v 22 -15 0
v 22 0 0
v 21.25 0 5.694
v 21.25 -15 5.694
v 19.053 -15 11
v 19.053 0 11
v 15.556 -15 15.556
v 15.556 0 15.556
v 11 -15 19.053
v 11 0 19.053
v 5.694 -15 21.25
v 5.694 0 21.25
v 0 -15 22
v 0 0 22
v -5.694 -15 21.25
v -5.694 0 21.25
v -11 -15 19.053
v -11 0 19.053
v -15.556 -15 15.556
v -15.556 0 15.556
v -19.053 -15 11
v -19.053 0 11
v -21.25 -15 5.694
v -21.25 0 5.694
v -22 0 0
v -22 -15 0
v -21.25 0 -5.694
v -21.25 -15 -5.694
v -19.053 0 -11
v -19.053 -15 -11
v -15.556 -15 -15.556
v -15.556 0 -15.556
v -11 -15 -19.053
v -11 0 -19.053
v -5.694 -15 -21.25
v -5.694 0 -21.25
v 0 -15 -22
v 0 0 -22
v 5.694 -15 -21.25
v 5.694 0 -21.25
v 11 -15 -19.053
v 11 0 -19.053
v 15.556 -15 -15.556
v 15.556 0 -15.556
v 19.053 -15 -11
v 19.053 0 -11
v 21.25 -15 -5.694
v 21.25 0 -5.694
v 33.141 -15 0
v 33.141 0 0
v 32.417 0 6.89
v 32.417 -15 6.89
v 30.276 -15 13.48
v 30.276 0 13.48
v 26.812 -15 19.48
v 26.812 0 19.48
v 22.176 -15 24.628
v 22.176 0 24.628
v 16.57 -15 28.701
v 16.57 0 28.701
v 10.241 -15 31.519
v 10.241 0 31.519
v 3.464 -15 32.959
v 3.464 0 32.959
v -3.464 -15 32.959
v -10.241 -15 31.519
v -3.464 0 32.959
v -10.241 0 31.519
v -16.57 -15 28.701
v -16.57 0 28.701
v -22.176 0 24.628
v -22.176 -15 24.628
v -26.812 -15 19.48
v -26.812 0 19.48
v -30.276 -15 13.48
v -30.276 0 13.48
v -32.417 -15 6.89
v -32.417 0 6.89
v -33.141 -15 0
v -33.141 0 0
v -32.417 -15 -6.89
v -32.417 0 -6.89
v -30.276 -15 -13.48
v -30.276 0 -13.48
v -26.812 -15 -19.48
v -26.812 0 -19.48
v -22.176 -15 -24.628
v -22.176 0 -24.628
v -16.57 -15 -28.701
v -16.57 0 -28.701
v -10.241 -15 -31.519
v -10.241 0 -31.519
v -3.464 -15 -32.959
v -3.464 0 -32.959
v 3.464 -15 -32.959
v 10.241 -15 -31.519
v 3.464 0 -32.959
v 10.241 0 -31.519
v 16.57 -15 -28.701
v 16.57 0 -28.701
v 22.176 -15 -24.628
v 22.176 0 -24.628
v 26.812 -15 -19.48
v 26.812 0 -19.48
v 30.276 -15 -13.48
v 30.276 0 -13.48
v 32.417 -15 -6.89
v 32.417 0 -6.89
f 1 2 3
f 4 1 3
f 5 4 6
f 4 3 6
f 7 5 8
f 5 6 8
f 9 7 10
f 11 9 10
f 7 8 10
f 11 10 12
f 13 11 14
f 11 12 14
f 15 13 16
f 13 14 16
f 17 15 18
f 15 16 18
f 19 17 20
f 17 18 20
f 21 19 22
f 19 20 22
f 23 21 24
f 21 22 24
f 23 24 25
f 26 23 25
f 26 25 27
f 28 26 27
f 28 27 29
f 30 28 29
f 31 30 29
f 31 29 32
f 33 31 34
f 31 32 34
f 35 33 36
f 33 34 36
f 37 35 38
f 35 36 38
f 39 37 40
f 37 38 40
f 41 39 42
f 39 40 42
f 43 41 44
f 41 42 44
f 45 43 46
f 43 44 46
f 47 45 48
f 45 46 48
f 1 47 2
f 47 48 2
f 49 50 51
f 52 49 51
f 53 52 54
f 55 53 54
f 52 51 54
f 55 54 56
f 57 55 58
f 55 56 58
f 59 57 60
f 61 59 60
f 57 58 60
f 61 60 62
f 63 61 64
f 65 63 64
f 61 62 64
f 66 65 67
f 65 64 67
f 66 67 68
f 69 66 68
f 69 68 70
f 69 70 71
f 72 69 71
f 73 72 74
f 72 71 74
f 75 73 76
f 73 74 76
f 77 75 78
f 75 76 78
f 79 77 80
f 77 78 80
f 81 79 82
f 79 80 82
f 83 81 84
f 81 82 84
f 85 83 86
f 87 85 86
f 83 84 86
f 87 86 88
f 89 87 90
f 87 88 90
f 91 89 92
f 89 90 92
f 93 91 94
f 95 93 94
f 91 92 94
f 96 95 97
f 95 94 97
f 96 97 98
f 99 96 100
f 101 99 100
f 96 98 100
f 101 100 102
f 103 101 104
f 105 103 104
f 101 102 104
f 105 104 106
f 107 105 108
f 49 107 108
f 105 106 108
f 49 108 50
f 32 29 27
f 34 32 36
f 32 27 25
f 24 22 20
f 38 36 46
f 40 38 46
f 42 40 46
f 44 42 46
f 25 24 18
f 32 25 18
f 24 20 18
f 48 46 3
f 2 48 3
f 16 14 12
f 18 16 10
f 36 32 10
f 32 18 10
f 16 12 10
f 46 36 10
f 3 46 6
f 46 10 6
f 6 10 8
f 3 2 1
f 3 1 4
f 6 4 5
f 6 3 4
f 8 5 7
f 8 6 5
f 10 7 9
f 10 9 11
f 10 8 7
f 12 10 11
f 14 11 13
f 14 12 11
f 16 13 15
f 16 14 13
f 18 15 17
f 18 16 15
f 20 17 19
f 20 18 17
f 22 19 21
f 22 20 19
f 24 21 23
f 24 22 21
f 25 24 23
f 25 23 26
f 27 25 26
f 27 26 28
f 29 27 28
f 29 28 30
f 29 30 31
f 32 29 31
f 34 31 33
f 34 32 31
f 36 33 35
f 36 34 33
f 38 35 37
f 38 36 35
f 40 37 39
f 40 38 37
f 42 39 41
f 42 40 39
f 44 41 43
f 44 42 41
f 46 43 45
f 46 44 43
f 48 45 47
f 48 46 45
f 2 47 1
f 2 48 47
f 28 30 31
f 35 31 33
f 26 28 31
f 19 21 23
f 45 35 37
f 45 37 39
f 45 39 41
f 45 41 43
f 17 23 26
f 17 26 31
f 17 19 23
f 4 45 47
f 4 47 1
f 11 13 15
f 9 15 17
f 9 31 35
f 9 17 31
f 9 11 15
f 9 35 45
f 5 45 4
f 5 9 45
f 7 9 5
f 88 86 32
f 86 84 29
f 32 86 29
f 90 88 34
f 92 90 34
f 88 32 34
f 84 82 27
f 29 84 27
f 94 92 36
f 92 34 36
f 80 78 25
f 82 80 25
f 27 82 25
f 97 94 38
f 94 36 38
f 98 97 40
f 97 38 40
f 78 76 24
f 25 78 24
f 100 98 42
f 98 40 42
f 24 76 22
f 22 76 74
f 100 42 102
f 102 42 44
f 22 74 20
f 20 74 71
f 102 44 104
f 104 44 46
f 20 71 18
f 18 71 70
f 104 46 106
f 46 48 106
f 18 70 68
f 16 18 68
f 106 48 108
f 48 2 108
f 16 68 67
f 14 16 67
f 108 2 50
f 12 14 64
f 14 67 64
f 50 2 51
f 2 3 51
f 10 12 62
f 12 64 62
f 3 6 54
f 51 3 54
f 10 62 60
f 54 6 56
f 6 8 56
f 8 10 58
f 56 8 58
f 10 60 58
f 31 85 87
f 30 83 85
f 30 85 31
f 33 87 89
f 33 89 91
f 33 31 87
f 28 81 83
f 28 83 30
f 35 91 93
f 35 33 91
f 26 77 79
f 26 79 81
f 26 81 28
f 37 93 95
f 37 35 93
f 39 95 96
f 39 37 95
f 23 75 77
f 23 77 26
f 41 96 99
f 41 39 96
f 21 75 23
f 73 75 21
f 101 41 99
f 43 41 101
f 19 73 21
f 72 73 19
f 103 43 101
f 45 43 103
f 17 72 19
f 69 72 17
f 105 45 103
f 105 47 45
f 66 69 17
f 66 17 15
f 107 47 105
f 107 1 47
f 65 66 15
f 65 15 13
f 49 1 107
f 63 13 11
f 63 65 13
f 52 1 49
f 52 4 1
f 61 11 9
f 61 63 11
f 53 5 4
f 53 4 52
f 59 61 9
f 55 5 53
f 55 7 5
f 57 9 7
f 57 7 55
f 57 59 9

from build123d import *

# Parameters (mm, degrees)
F0_R     = 33.1408676413
F0_R_2   = 22
F2_DEPTH = 15
F1_R     = 22


with BuildPart() as f2:
    # F0 (on Front) → F2 (new body)
    with BuildSketch(Plane.XZ):
        Circle(F0_R)
        Circle(F0_R_2, mode=Mode.SUBTRACT)
    extrude(amount=F2_DEPTH)


with BuildPart() as f2b:
    # F1 (on face) → F2, piece 2 (new body)
    with BuildSketch(Plane.XZ):
        Circle(F1_R)
    extrude(amount=F2_DEPTH)


solid = Compound([f2.part, f2b.part])
